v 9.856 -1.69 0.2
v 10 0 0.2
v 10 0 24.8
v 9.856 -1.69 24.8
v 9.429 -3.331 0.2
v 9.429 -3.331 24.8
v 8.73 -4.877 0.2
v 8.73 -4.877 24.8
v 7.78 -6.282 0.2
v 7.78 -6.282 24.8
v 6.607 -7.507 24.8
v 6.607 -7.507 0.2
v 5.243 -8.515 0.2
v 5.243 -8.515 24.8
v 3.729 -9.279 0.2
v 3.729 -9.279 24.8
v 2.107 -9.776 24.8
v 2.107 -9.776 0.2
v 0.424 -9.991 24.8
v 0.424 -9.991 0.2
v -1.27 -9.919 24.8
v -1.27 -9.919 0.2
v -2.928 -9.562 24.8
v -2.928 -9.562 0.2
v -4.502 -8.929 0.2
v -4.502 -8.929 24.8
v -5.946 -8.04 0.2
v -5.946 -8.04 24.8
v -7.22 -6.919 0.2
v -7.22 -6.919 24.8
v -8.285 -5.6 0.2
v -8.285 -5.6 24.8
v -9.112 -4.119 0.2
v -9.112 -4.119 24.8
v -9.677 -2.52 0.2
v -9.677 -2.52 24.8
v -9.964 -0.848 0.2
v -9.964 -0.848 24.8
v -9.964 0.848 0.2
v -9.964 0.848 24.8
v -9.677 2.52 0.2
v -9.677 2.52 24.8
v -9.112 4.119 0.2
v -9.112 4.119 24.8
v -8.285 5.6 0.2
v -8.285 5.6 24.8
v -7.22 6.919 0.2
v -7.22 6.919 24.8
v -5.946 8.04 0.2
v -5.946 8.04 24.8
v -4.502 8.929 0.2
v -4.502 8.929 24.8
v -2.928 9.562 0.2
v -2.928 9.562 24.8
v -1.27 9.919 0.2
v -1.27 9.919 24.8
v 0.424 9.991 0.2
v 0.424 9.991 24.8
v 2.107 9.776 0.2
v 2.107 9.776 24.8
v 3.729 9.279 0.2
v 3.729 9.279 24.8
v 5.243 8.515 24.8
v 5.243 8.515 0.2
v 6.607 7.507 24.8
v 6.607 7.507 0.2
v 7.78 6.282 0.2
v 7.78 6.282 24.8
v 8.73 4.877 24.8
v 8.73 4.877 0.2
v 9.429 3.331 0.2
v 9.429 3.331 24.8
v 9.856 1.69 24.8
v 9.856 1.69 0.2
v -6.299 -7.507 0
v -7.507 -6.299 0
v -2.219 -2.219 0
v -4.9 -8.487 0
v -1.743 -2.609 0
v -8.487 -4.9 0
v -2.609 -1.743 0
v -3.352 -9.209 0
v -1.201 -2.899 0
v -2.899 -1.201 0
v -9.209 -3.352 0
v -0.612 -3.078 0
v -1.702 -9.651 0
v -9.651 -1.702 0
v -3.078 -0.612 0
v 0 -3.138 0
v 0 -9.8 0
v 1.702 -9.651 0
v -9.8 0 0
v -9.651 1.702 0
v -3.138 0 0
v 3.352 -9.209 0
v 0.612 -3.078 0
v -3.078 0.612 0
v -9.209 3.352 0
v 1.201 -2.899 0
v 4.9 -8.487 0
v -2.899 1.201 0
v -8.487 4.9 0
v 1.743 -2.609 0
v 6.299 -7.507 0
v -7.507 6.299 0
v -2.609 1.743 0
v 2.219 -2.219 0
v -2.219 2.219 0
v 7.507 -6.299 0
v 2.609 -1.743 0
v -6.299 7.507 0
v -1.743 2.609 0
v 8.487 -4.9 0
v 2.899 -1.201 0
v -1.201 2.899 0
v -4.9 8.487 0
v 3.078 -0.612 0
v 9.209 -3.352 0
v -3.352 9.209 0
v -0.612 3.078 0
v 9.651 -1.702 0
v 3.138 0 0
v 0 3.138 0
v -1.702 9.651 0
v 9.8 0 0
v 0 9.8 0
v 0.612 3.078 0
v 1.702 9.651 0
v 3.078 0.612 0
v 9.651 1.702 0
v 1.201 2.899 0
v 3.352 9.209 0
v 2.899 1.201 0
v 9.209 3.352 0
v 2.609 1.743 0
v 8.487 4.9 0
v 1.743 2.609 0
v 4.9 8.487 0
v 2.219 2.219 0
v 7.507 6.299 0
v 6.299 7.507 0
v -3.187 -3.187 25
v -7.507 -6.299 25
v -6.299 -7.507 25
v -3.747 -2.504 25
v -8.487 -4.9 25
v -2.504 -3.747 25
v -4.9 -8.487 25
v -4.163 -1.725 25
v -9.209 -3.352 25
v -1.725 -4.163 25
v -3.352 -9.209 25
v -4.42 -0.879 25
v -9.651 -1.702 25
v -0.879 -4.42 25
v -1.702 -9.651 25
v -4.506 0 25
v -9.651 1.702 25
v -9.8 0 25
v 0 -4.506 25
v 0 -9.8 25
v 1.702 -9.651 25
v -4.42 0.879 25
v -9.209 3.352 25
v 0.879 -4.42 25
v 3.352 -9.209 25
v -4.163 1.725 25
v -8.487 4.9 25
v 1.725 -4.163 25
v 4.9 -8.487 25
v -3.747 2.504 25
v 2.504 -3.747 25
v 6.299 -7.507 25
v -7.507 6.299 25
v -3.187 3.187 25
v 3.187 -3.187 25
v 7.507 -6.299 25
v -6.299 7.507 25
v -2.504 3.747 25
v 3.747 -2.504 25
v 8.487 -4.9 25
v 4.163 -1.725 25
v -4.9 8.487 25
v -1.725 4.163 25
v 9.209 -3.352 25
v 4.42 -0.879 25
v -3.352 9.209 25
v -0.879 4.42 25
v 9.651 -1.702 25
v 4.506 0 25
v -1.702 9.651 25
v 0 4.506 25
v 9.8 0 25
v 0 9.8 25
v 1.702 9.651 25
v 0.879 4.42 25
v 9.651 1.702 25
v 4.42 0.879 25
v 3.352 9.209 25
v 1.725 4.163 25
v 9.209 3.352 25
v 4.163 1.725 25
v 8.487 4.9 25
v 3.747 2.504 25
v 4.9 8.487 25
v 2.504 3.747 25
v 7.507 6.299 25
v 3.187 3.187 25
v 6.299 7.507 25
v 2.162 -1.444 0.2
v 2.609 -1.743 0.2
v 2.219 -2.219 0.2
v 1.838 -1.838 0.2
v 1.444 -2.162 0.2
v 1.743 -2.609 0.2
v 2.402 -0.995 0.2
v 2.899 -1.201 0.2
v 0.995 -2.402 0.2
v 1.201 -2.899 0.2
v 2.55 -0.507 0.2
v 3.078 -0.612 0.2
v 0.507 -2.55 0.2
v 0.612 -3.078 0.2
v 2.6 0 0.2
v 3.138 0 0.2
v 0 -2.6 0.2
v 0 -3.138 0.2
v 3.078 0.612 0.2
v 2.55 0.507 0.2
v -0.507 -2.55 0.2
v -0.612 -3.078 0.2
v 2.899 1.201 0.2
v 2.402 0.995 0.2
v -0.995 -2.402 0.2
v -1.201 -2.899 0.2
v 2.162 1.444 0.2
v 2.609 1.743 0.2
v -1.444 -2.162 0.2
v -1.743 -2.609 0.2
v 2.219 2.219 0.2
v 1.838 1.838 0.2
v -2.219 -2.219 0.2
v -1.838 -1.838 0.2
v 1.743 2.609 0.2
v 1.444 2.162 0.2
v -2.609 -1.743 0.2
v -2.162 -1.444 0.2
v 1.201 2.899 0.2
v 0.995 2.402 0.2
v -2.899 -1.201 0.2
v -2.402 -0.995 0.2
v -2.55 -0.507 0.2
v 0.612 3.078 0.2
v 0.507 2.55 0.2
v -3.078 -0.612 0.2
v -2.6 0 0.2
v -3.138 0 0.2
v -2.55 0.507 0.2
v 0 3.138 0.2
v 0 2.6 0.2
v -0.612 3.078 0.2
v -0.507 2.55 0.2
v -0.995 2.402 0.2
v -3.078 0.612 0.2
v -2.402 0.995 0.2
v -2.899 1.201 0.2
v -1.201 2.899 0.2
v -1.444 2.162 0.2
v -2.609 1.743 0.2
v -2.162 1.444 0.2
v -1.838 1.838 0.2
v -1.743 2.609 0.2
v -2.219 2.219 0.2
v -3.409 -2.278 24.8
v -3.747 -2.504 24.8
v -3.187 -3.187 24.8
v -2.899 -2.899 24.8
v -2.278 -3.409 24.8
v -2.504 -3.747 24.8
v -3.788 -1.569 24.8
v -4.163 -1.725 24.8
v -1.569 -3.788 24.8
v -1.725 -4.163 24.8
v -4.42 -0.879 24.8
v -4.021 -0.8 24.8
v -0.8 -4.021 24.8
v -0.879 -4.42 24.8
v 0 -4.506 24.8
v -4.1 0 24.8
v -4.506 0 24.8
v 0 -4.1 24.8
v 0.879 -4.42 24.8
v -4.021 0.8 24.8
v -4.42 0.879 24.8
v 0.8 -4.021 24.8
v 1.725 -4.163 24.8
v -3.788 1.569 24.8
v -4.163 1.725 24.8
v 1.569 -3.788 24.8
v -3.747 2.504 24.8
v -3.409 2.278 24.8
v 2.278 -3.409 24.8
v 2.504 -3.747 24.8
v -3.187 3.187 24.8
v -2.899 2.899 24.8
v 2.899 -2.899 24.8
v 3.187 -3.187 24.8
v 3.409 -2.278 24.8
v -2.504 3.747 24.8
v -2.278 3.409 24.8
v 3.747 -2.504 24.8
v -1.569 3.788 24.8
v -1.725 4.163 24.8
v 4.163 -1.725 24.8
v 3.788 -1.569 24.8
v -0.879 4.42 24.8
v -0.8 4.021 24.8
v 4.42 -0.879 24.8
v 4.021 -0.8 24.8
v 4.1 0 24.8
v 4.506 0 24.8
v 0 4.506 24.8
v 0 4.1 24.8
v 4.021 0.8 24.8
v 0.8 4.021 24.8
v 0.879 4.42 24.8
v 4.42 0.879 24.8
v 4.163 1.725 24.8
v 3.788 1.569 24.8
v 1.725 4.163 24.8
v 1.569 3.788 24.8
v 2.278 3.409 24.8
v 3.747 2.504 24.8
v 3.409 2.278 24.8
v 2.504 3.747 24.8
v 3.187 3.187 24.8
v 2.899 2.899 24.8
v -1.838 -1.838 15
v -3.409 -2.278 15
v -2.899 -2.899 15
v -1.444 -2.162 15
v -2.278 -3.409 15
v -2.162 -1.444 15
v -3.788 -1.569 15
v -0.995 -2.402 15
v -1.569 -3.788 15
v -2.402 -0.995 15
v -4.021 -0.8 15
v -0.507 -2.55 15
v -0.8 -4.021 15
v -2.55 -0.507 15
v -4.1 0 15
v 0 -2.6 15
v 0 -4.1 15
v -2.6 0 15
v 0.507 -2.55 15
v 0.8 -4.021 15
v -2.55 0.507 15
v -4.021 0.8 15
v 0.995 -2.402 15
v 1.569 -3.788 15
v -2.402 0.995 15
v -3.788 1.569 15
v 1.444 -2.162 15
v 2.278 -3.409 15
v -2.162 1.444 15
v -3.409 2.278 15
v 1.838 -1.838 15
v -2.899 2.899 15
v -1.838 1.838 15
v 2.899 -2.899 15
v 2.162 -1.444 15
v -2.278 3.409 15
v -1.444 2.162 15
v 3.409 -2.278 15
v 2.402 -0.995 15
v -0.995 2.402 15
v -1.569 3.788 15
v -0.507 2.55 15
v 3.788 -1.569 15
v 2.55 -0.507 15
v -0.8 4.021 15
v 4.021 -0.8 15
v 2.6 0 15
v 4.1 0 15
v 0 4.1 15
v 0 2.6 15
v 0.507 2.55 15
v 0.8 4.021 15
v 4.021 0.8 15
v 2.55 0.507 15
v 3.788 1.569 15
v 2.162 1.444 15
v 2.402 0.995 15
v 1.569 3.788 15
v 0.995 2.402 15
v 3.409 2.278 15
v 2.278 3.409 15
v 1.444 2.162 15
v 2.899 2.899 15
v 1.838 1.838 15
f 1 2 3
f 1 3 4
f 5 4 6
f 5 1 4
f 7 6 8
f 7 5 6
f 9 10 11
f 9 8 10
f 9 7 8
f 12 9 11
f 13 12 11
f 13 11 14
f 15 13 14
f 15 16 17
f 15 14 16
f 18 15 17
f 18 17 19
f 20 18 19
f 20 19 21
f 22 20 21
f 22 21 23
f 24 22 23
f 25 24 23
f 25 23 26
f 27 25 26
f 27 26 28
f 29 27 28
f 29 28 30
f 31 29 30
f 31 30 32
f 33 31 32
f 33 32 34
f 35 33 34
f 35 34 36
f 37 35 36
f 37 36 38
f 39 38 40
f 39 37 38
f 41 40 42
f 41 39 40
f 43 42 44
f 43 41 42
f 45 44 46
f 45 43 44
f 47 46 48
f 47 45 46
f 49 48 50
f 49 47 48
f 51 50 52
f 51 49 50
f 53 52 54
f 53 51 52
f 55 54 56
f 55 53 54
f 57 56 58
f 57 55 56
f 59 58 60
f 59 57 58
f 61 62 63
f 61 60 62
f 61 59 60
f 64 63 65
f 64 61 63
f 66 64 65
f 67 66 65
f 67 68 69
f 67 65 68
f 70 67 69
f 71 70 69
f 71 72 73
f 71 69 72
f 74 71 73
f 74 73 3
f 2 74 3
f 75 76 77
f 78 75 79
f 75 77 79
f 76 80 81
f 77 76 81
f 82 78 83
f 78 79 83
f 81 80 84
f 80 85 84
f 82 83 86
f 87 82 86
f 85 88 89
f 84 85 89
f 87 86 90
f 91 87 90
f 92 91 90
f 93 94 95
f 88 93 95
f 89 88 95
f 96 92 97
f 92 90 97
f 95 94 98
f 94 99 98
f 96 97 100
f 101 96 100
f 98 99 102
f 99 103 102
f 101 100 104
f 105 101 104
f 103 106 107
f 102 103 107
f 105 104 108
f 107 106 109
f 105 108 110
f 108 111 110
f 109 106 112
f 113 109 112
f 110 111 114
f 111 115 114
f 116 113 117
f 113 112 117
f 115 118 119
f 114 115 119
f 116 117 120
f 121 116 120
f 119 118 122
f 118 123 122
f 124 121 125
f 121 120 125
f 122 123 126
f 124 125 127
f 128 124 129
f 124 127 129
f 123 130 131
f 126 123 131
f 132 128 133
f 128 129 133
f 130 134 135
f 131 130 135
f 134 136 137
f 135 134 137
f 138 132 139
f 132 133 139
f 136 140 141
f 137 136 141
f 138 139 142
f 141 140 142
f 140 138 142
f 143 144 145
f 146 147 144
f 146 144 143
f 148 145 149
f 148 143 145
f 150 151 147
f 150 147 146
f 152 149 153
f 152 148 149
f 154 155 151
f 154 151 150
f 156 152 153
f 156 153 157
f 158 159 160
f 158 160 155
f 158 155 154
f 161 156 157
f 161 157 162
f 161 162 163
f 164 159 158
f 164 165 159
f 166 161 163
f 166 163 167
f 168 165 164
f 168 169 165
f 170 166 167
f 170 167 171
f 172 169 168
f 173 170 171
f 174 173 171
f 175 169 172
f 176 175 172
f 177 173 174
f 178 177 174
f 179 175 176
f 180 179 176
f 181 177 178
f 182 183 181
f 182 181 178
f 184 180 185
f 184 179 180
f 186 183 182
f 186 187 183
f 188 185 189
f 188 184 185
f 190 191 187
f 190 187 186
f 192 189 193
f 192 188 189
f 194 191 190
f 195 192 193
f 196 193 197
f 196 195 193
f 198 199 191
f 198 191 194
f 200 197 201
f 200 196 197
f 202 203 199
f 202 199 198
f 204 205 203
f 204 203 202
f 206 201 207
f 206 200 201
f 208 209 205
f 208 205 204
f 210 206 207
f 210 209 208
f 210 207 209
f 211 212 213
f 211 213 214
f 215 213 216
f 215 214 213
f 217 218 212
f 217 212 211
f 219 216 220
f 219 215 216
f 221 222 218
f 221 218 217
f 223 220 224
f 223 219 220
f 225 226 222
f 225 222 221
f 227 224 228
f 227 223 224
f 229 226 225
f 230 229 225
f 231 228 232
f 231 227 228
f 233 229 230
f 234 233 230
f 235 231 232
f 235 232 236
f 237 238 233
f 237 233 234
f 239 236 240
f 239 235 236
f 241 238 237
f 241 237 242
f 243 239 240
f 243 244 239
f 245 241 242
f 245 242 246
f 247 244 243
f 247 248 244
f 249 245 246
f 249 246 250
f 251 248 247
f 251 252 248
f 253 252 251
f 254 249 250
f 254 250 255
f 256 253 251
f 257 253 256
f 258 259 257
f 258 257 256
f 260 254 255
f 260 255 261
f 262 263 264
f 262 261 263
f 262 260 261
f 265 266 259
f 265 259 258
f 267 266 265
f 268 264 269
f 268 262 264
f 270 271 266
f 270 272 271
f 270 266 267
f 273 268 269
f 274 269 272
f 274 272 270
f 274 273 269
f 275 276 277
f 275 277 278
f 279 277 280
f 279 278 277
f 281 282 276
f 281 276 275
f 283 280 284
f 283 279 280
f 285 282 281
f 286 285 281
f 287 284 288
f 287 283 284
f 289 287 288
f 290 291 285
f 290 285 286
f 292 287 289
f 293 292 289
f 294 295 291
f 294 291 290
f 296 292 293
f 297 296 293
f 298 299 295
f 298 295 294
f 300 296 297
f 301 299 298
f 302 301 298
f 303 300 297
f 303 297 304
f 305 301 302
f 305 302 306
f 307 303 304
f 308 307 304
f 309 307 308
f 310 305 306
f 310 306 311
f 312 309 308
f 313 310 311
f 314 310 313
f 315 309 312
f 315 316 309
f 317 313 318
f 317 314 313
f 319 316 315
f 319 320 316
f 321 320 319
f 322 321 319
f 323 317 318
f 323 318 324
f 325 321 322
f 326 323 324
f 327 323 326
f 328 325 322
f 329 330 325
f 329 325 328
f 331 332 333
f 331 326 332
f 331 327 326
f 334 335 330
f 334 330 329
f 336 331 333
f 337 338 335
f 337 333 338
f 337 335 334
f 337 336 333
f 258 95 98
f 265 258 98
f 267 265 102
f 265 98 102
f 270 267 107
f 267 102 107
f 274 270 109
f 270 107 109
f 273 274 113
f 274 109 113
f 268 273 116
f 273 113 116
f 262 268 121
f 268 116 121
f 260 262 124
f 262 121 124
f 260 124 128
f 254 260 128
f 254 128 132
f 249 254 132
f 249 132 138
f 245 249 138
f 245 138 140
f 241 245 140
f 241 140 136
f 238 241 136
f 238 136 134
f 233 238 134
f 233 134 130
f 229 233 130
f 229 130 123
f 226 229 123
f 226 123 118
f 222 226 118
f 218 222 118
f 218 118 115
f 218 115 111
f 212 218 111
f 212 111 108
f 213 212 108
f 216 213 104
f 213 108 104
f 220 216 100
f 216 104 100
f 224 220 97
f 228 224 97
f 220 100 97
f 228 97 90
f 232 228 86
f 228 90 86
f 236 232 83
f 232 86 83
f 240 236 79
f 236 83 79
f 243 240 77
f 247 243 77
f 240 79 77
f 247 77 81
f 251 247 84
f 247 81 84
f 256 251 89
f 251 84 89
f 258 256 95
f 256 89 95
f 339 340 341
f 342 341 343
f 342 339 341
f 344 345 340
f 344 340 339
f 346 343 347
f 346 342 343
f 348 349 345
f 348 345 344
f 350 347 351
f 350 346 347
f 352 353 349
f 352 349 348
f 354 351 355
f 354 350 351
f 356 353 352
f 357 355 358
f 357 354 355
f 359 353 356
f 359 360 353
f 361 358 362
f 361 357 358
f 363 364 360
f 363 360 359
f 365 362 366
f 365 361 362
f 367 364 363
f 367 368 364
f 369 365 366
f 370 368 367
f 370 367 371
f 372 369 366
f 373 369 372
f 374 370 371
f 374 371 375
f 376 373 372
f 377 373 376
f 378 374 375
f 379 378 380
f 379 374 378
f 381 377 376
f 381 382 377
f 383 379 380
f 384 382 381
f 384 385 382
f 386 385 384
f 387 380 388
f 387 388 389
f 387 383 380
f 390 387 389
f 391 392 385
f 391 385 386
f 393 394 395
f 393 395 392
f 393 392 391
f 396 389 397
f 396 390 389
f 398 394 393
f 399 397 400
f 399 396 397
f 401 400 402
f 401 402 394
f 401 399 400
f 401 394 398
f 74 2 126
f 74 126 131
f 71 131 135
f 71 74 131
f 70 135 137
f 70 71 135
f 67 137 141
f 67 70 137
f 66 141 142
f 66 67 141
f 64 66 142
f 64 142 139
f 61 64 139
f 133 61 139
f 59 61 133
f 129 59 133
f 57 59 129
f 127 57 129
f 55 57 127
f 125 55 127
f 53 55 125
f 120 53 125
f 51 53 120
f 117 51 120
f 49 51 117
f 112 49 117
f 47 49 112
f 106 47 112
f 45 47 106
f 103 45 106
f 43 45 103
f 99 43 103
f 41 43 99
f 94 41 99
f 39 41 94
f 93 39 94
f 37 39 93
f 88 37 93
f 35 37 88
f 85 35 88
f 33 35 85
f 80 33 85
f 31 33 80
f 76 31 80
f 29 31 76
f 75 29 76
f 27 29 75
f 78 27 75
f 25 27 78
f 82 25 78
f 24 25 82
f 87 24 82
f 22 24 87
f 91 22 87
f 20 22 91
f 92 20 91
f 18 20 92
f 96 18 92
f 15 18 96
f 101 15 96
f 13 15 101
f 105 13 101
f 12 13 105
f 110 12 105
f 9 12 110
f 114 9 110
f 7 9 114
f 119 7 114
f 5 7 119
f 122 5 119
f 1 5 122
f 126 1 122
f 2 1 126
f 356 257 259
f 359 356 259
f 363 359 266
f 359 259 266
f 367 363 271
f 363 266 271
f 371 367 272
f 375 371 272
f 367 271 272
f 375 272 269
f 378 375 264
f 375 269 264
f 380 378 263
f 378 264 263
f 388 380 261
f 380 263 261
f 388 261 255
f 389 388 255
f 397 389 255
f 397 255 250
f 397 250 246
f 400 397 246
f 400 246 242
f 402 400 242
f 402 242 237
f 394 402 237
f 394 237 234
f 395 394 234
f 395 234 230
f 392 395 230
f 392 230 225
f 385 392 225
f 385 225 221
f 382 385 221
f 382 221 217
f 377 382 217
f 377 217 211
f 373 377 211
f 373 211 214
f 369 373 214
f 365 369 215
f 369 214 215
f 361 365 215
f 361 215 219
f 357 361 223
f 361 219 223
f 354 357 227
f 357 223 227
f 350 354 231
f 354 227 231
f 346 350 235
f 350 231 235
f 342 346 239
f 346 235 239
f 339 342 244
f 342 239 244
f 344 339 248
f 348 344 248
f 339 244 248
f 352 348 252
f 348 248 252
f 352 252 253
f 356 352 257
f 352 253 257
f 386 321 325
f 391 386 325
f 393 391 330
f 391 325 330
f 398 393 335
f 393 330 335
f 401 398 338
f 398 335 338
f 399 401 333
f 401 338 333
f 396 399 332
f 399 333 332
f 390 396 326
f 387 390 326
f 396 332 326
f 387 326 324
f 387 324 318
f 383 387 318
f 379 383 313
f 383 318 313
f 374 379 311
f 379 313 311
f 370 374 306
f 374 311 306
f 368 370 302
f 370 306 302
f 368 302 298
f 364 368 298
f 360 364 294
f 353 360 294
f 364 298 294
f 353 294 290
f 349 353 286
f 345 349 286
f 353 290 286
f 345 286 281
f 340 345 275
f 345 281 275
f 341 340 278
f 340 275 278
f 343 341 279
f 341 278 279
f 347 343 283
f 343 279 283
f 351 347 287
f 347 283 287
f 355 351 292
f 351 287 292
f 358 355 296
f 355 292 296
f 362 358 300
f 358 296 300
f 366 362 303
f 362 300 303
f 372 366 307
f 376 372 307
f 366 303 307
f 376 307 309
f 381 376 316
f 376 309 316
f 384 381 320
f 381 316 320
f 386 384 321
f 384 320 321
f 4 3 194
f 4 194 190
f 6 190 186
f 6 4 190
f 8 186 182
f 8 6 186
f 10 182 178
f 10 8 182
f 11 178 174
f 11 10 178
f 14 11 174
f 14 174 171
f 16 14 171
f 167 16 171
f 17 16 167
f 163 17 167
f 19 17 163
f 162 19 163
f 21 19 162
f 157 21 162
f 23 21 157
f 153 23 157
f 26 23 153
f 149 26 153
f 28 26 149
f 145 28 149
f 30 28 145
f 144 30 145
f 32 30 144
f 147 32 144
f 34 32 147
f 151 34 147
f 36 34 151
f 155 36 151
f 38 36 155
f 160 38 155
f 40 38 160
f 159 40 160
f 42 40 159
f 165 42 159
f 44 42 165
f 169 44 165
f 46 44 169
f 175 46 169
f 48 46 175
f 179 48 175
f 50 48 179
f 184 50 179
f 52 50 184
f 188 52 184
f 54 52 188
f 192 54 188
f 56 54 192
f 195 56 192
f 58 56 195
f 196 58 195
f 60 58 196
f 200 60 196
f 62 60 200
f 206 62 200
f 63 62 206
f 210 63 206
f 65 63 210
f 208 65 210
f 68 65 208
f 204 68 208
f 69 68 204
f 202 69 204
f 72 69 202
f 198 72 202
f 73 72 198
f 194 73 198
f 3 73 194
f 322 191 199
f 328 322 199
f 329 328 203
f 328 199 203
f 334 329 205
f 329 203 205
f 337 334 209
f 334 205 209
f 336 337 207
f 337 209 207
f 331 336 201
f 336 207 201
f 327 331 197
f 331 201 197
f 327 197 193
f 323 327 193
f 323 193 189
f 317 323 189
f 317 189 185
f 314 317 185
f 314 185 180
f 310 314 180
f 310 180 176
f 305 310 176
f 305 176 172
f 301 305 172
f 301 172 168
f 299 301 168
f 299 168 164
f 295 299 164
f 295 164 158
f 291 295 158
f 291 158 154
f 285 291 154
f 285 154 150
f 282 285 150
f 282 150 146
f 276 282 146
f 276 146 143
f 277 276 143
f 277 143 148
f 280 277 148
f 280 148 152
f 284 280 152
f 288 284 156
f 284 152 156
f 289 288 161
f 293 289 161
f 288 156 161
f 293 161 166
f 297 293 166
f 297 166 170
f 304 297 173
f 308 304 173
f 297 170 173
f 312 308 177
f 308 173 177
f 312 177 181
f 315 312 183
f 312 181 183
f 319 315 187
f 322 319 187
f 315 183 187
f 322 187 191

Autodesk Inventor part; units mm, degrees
ref_plane "YZ Plane" through (0, 0, 0) normal (1, 0, 0) x (0, 1, 0)
ref_plane "XZ Plane" through (0, 0, 0) normal (0, 1, 0) x (-1, 0, 0)
ref_plane "XY Plane" through (0, 0, 0) normal (0, 0, 1) x (1, 0, 0)
sketch "Sketch2" plane through (0, 0, 0) normal (0, 0, 1) x (1, 0, 0)
  circle A0 centre (0, 0) radius 10
  dimension "d7" = 20
extrude "Extrusion2" add sketch "Sketch2" along normal blind 25
sketch "Sketch3" plane through (0, 0, 25) normal (0, 0, 1) x (1, 0, 0)
  circle A0 centre (0, 0) radius 4.1
  dimension "d10" = 8.2
extrude "Extrusion3" cut sketch "Sketch3" against normal blind 10
thread "Thread1" size "M9x1.25" class "6H" standard "ANSI Metric M Profile" length 12000
sketch "Sketch4" plane through (0, 0, 0) normal (0, 0, -1) x (-1, 0, 0)
  circle A0 centre (0, 0) radius 2.6
  dimension "d15" = 5.2
extrude "Extrusion4" cut sketch "Sketch4" against normal blind 15.175
thread "Thread2" size "M5.5x0.5" class "6H" standard "ANSI Metric M Profile" length 12000
chamfer "Chamfer1" distance 0.2 angle 45 1 edges at (-10, 0, 25)
chamfer "Chamfer2" distance 0.2 angle 45 1 edges at (-10, 0, 0)
sketch "Sketch5" plane through (0, 0, 0) normal (0, 1, 0) x (-1, 0, 0)
  point P0 (0, 0)
  point P1 (10, 0.2)
sketch "Sketch6" plane through (0, 0, 25) normal (0, 0, 1) x (1, 0, 0)
  circle A0 centre (0, 0) radius 4.5065
extrude "Extrusion5" cut sketch "Sketch6" against normal blind 0.2
sketch "Sketch7" plane through (0, 0, 0) normal (0, 0, -1) x (-1, 0, 0)
  circle A0 centre (0, 0) radius 3.1378
extrude "Extrusion6" cut sketch "Sketch7" against normal blind 0.2
sketch "Sketch8" plane through (0, 0, 25) normal (0, 0, 1) x (1, 0, 0)
  point P0 (0, 0)
sketch "Sketch9" plane through (0, 0, 25) normal (0, 0, 1) x (1, 0, 0)
  point P0 (0, 0)
sketch "Sketch10" plane through (0, 0, 25) normal (0, 0, 1) x (1, 0, 0)
  point P0 (0, 0)
properties part number "coupler"
